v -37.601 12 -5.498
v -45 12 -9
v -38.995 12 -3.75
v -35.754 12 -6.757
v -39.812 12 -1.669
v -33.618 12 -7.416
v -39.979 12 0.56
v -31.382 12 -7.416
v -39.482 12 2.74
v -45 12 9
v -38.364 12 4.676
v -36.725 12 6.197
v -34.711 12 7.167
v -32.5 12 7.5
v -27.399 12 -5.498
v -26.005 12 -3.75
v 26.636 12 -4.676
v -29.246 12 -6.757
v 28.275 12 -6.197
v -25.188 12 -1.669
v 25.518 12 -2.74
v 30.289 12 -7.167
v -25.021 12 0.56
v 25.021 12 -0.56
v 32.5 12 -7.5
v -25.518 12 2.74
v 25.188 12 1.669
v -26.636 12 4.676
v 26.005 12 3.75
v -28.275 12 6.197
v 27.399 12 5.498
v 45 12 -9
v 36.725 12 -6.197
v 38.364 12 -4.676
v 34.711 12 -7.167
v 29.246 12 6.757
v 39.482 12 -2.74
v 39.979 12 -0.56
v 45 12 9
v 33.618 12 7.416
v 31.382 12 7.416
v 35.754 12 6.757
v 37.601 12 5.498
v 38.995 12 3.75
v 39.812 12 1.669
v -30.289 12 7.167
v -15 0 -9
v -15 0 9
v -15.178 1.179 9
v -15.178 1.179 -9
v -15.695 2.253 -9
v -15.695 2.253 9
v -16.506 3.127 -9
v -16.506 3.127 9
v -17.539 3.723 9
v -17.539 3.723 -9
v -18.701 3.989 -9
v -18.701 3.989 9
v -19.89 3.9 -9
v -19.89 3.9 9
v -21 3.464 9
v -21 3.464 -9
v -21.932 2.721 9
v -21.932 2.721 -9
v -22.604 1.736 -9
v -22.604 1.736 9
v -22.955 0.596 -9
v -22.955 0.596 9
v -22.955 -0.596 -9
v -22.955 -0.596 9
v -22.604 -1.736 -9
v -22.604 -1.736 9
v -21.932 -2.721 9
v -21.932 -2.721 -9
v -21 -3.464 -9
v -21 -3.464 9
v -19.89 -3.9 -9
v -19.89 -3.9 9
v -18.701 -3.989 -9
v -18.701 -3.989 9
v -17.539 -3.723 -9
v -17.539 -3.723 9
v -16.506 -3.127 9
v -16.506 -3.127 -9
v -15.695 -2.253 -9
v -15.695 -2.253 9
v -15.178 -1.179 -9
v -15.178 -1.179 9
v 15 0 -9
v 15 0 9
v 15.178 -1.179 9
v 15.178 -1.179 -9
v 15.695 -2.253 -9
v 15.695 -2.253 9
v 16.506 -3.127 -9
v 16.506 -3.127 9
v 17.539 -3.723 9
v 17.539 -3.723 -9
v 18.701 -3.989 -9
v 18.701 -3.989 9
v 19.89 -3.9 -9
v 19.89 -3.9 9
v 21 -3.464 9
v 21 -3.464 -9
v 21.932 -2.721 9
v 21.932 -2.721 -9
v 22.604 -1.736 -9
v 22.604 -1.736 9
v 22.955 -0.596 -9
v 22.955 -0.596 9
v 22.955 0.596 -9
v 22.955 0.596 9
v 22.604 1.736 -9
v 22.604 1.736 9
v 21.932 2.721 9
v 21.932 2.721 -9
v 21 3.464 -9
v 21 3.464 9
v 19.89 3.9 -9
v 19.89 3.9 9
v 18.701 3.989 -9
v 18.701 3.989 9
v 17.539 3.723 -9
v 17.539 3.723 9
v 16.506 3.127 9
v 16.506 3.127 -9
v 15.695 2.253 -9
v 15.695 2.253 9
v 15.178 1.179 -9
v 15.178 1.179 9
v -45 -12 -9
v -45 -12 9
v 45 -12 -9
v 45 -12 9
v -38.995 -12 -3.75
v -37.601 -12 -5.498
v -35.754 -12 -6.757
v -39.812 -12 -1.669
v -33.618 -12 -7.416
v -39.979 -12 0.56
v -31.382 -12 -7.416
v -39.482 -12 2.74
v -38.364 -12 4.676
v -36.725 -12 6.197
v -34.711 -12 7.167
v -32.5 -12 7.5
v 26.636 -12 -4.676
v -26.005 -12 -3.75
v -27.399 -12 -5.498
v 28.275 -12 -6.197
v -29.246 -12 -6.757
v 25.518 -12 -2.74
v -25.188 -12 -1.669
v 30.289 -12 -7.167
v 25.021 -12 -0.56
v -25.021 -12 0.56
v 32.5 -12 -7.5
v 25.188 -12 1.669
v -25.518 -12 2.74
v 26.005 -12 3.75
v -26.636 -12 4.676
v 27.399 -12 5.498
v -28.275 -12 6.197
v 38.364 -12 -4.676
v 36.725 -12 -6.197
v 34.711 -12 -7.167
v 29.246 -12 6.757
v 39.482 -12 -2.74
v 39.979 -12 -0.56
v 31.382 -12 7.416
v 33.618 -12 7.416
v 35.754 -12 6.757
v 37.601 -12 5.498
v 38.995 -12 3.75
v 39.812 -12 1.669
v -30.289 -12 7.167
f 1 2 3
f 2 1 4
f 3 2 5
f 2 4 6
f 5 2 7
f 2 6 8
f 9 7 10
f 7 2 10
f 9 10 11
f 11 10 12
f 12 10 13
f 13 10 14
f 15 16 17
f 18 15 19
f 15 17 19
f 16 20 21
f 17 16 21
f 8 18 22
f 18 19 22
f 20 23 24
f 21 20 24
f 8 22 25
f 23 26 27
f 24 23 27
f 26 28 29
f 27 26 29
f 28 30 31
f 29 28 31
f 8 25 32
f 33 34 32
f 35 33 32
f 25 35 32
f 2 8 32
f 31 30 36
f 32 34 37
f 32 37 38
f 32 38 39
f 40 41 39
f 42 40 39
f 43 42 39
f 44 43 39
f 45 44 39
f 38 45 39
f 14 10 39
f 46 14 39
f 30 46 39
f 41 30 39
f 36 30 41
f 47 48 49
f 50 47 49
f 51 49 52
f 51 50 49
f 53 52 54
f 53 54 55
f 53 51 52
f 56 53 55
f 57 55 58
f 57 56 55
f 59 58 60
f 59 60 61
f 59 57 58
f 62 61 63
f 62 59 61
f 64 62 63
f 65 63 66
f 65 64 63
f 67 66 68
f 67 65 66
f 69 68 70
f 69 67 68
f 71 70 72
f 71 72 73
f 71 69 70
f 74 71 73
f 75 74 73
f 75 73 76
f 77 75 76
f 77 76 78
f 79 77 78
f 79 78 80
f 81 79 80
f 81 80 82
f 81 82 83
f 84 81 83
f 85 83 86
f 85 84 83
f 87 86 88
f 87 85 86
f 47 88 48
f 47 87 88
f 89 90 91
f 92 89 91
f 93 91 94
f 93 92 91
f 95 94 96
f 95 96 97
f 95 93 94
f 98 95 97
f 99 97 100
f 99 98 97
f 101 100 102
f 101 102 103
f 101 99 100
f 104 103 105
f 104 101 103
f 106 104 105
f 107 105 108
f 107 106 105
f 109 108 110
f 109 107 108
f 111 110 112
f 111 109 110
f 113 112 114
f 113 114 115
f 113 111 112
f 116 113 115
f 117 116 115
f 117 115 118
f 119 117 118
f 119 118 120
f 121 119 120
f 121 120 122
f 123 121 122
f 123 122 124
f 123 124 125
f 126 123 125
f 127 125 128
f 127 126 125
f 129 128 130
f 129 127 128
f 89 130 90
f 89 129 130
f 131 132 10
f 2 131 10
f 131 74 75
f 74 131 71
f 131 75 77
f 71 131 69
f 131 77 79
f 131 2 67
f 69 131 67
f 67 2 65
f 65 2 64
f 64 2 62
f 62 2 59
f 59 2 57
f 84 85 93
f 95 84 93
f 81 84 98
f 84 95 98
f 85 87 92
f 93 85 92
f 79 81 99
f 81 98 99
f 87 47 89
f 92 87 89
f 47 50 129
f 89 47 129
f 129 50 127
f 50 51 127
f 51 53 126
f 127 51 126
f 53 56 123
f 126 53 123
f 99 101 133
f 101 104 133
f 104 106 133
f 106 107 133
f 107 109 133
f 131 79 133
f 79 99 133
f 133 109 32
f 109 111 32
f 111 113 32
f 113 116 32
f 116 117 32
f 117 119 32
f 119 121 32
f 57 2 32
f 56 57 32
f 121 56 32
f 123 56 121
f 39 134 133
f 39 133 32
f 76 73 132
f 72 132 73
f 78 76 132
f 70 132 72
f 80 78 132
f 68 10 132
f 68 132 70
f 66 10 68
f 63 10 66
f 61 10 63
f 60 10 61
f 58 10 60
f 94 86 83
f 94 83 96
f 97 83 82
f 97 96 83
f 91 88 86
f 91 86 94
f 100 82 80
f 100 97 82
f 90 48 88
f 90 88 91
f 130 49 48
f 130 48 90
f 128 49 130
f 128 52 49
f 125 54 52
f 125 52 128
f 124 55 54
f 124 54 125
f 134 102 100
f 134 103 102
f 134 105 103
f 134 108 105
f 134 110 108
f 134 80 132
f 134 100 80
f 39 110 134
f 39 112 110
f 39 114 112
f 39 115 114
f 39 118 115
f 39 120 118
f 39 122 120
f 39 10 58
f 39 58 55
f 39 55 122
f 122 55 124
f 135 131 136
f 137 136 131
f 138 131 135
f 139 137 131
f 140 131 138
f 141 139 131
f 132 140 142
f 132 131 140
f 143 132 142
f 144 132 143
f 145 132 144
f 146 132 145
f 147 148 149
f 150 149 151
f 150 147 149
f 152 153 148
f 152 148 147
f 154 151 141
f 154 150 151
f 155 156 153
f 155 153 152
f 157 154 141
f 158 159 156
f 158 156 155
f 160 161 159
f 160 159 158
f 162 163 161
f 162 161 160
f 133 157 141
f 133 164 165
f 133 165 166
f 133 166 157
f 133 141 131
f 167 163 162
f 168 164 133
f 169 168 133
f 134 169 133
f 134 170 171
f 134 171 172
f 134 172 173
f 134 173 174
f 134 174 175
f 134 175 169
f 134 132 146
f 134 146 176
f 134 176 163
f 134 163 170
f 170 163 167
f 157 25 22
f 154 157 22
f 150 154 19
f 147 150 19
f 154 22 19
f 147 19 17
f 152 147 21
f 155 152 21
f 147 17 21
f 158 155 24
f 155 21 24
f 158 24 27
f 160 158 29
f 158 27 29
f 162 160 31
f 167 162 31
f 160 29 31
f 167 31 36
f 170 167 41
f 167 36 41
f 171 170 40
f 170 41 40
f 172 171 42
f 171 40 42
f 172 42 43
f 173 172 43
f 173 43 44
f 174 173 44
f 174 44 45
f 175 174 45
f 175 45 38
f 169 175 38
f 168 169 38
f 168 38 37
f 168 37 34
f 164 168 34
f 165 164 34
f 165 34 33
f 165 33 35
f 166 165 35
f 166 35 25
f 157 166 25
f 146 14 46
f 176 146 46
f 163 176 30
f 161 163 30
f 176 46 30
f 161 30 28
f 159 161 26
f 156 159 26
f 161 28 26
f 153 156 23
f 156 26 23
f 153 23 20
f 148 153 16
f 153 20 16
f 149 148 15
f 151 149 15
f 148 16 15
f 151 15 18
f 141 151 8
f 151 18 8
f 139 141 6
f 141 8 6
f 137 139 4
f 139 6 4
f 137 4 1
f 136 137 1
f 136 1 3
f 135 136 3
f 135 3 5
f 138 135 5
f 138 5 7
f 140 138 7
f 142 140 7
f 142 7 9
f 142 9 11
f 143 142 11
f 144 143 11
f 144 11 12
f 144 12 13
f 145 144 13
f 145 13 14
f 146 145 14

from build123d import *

# Parameters (mm, degrees)
SKETCH1_W           = 90
SKETCH1_H           = 24
SKETCH1_R           = 4
BOSS_EXTRUDE1_DEPTH = 9
SKETCH2_R           = 7.5
CUT_EXTRUDE3_DEPTH  = 52.788029505


with BuildPart() as part:
    # Sketch1 → Boss-Extrude1 (new, symmetric)
    with BuildSketch(Plane.XY):
        Rectangle(SKETCH1_W, SKETCH1_H)
        with Locations((-19, 0)):
            Circle(SKETCH1_R, mode=Mode.SUBTRACT)
        with Locations(Location((19, 0, 0), (0, 0, 180))):
            Circle(SKETCH1_R, mode=Mode.SUBTRACT)
    extrude(amount=BOSS_EXTRUDE1_DEPTH, both=True)

    # Sketch2 → Cut-Extrude3 (cut, through all)
    with BuildSketch(Plane(origin=(0, 12, 0), x_dir=(1, 0, 0), z_dir=(0, 1, 0))):
        with Locations(Location((-32.5, 0, 0), (0, 0, 270))):
            Circle(SKETCH2_R)
        with Locations(Location((32.5, 0, 0), (0, 0, 90))):
            Circle(SKETCH2_R)
    extrude(amount=-CUT_EXTRUDE3_DEPTH, mode=Mode.SUBTRACT)


solid = part.part
